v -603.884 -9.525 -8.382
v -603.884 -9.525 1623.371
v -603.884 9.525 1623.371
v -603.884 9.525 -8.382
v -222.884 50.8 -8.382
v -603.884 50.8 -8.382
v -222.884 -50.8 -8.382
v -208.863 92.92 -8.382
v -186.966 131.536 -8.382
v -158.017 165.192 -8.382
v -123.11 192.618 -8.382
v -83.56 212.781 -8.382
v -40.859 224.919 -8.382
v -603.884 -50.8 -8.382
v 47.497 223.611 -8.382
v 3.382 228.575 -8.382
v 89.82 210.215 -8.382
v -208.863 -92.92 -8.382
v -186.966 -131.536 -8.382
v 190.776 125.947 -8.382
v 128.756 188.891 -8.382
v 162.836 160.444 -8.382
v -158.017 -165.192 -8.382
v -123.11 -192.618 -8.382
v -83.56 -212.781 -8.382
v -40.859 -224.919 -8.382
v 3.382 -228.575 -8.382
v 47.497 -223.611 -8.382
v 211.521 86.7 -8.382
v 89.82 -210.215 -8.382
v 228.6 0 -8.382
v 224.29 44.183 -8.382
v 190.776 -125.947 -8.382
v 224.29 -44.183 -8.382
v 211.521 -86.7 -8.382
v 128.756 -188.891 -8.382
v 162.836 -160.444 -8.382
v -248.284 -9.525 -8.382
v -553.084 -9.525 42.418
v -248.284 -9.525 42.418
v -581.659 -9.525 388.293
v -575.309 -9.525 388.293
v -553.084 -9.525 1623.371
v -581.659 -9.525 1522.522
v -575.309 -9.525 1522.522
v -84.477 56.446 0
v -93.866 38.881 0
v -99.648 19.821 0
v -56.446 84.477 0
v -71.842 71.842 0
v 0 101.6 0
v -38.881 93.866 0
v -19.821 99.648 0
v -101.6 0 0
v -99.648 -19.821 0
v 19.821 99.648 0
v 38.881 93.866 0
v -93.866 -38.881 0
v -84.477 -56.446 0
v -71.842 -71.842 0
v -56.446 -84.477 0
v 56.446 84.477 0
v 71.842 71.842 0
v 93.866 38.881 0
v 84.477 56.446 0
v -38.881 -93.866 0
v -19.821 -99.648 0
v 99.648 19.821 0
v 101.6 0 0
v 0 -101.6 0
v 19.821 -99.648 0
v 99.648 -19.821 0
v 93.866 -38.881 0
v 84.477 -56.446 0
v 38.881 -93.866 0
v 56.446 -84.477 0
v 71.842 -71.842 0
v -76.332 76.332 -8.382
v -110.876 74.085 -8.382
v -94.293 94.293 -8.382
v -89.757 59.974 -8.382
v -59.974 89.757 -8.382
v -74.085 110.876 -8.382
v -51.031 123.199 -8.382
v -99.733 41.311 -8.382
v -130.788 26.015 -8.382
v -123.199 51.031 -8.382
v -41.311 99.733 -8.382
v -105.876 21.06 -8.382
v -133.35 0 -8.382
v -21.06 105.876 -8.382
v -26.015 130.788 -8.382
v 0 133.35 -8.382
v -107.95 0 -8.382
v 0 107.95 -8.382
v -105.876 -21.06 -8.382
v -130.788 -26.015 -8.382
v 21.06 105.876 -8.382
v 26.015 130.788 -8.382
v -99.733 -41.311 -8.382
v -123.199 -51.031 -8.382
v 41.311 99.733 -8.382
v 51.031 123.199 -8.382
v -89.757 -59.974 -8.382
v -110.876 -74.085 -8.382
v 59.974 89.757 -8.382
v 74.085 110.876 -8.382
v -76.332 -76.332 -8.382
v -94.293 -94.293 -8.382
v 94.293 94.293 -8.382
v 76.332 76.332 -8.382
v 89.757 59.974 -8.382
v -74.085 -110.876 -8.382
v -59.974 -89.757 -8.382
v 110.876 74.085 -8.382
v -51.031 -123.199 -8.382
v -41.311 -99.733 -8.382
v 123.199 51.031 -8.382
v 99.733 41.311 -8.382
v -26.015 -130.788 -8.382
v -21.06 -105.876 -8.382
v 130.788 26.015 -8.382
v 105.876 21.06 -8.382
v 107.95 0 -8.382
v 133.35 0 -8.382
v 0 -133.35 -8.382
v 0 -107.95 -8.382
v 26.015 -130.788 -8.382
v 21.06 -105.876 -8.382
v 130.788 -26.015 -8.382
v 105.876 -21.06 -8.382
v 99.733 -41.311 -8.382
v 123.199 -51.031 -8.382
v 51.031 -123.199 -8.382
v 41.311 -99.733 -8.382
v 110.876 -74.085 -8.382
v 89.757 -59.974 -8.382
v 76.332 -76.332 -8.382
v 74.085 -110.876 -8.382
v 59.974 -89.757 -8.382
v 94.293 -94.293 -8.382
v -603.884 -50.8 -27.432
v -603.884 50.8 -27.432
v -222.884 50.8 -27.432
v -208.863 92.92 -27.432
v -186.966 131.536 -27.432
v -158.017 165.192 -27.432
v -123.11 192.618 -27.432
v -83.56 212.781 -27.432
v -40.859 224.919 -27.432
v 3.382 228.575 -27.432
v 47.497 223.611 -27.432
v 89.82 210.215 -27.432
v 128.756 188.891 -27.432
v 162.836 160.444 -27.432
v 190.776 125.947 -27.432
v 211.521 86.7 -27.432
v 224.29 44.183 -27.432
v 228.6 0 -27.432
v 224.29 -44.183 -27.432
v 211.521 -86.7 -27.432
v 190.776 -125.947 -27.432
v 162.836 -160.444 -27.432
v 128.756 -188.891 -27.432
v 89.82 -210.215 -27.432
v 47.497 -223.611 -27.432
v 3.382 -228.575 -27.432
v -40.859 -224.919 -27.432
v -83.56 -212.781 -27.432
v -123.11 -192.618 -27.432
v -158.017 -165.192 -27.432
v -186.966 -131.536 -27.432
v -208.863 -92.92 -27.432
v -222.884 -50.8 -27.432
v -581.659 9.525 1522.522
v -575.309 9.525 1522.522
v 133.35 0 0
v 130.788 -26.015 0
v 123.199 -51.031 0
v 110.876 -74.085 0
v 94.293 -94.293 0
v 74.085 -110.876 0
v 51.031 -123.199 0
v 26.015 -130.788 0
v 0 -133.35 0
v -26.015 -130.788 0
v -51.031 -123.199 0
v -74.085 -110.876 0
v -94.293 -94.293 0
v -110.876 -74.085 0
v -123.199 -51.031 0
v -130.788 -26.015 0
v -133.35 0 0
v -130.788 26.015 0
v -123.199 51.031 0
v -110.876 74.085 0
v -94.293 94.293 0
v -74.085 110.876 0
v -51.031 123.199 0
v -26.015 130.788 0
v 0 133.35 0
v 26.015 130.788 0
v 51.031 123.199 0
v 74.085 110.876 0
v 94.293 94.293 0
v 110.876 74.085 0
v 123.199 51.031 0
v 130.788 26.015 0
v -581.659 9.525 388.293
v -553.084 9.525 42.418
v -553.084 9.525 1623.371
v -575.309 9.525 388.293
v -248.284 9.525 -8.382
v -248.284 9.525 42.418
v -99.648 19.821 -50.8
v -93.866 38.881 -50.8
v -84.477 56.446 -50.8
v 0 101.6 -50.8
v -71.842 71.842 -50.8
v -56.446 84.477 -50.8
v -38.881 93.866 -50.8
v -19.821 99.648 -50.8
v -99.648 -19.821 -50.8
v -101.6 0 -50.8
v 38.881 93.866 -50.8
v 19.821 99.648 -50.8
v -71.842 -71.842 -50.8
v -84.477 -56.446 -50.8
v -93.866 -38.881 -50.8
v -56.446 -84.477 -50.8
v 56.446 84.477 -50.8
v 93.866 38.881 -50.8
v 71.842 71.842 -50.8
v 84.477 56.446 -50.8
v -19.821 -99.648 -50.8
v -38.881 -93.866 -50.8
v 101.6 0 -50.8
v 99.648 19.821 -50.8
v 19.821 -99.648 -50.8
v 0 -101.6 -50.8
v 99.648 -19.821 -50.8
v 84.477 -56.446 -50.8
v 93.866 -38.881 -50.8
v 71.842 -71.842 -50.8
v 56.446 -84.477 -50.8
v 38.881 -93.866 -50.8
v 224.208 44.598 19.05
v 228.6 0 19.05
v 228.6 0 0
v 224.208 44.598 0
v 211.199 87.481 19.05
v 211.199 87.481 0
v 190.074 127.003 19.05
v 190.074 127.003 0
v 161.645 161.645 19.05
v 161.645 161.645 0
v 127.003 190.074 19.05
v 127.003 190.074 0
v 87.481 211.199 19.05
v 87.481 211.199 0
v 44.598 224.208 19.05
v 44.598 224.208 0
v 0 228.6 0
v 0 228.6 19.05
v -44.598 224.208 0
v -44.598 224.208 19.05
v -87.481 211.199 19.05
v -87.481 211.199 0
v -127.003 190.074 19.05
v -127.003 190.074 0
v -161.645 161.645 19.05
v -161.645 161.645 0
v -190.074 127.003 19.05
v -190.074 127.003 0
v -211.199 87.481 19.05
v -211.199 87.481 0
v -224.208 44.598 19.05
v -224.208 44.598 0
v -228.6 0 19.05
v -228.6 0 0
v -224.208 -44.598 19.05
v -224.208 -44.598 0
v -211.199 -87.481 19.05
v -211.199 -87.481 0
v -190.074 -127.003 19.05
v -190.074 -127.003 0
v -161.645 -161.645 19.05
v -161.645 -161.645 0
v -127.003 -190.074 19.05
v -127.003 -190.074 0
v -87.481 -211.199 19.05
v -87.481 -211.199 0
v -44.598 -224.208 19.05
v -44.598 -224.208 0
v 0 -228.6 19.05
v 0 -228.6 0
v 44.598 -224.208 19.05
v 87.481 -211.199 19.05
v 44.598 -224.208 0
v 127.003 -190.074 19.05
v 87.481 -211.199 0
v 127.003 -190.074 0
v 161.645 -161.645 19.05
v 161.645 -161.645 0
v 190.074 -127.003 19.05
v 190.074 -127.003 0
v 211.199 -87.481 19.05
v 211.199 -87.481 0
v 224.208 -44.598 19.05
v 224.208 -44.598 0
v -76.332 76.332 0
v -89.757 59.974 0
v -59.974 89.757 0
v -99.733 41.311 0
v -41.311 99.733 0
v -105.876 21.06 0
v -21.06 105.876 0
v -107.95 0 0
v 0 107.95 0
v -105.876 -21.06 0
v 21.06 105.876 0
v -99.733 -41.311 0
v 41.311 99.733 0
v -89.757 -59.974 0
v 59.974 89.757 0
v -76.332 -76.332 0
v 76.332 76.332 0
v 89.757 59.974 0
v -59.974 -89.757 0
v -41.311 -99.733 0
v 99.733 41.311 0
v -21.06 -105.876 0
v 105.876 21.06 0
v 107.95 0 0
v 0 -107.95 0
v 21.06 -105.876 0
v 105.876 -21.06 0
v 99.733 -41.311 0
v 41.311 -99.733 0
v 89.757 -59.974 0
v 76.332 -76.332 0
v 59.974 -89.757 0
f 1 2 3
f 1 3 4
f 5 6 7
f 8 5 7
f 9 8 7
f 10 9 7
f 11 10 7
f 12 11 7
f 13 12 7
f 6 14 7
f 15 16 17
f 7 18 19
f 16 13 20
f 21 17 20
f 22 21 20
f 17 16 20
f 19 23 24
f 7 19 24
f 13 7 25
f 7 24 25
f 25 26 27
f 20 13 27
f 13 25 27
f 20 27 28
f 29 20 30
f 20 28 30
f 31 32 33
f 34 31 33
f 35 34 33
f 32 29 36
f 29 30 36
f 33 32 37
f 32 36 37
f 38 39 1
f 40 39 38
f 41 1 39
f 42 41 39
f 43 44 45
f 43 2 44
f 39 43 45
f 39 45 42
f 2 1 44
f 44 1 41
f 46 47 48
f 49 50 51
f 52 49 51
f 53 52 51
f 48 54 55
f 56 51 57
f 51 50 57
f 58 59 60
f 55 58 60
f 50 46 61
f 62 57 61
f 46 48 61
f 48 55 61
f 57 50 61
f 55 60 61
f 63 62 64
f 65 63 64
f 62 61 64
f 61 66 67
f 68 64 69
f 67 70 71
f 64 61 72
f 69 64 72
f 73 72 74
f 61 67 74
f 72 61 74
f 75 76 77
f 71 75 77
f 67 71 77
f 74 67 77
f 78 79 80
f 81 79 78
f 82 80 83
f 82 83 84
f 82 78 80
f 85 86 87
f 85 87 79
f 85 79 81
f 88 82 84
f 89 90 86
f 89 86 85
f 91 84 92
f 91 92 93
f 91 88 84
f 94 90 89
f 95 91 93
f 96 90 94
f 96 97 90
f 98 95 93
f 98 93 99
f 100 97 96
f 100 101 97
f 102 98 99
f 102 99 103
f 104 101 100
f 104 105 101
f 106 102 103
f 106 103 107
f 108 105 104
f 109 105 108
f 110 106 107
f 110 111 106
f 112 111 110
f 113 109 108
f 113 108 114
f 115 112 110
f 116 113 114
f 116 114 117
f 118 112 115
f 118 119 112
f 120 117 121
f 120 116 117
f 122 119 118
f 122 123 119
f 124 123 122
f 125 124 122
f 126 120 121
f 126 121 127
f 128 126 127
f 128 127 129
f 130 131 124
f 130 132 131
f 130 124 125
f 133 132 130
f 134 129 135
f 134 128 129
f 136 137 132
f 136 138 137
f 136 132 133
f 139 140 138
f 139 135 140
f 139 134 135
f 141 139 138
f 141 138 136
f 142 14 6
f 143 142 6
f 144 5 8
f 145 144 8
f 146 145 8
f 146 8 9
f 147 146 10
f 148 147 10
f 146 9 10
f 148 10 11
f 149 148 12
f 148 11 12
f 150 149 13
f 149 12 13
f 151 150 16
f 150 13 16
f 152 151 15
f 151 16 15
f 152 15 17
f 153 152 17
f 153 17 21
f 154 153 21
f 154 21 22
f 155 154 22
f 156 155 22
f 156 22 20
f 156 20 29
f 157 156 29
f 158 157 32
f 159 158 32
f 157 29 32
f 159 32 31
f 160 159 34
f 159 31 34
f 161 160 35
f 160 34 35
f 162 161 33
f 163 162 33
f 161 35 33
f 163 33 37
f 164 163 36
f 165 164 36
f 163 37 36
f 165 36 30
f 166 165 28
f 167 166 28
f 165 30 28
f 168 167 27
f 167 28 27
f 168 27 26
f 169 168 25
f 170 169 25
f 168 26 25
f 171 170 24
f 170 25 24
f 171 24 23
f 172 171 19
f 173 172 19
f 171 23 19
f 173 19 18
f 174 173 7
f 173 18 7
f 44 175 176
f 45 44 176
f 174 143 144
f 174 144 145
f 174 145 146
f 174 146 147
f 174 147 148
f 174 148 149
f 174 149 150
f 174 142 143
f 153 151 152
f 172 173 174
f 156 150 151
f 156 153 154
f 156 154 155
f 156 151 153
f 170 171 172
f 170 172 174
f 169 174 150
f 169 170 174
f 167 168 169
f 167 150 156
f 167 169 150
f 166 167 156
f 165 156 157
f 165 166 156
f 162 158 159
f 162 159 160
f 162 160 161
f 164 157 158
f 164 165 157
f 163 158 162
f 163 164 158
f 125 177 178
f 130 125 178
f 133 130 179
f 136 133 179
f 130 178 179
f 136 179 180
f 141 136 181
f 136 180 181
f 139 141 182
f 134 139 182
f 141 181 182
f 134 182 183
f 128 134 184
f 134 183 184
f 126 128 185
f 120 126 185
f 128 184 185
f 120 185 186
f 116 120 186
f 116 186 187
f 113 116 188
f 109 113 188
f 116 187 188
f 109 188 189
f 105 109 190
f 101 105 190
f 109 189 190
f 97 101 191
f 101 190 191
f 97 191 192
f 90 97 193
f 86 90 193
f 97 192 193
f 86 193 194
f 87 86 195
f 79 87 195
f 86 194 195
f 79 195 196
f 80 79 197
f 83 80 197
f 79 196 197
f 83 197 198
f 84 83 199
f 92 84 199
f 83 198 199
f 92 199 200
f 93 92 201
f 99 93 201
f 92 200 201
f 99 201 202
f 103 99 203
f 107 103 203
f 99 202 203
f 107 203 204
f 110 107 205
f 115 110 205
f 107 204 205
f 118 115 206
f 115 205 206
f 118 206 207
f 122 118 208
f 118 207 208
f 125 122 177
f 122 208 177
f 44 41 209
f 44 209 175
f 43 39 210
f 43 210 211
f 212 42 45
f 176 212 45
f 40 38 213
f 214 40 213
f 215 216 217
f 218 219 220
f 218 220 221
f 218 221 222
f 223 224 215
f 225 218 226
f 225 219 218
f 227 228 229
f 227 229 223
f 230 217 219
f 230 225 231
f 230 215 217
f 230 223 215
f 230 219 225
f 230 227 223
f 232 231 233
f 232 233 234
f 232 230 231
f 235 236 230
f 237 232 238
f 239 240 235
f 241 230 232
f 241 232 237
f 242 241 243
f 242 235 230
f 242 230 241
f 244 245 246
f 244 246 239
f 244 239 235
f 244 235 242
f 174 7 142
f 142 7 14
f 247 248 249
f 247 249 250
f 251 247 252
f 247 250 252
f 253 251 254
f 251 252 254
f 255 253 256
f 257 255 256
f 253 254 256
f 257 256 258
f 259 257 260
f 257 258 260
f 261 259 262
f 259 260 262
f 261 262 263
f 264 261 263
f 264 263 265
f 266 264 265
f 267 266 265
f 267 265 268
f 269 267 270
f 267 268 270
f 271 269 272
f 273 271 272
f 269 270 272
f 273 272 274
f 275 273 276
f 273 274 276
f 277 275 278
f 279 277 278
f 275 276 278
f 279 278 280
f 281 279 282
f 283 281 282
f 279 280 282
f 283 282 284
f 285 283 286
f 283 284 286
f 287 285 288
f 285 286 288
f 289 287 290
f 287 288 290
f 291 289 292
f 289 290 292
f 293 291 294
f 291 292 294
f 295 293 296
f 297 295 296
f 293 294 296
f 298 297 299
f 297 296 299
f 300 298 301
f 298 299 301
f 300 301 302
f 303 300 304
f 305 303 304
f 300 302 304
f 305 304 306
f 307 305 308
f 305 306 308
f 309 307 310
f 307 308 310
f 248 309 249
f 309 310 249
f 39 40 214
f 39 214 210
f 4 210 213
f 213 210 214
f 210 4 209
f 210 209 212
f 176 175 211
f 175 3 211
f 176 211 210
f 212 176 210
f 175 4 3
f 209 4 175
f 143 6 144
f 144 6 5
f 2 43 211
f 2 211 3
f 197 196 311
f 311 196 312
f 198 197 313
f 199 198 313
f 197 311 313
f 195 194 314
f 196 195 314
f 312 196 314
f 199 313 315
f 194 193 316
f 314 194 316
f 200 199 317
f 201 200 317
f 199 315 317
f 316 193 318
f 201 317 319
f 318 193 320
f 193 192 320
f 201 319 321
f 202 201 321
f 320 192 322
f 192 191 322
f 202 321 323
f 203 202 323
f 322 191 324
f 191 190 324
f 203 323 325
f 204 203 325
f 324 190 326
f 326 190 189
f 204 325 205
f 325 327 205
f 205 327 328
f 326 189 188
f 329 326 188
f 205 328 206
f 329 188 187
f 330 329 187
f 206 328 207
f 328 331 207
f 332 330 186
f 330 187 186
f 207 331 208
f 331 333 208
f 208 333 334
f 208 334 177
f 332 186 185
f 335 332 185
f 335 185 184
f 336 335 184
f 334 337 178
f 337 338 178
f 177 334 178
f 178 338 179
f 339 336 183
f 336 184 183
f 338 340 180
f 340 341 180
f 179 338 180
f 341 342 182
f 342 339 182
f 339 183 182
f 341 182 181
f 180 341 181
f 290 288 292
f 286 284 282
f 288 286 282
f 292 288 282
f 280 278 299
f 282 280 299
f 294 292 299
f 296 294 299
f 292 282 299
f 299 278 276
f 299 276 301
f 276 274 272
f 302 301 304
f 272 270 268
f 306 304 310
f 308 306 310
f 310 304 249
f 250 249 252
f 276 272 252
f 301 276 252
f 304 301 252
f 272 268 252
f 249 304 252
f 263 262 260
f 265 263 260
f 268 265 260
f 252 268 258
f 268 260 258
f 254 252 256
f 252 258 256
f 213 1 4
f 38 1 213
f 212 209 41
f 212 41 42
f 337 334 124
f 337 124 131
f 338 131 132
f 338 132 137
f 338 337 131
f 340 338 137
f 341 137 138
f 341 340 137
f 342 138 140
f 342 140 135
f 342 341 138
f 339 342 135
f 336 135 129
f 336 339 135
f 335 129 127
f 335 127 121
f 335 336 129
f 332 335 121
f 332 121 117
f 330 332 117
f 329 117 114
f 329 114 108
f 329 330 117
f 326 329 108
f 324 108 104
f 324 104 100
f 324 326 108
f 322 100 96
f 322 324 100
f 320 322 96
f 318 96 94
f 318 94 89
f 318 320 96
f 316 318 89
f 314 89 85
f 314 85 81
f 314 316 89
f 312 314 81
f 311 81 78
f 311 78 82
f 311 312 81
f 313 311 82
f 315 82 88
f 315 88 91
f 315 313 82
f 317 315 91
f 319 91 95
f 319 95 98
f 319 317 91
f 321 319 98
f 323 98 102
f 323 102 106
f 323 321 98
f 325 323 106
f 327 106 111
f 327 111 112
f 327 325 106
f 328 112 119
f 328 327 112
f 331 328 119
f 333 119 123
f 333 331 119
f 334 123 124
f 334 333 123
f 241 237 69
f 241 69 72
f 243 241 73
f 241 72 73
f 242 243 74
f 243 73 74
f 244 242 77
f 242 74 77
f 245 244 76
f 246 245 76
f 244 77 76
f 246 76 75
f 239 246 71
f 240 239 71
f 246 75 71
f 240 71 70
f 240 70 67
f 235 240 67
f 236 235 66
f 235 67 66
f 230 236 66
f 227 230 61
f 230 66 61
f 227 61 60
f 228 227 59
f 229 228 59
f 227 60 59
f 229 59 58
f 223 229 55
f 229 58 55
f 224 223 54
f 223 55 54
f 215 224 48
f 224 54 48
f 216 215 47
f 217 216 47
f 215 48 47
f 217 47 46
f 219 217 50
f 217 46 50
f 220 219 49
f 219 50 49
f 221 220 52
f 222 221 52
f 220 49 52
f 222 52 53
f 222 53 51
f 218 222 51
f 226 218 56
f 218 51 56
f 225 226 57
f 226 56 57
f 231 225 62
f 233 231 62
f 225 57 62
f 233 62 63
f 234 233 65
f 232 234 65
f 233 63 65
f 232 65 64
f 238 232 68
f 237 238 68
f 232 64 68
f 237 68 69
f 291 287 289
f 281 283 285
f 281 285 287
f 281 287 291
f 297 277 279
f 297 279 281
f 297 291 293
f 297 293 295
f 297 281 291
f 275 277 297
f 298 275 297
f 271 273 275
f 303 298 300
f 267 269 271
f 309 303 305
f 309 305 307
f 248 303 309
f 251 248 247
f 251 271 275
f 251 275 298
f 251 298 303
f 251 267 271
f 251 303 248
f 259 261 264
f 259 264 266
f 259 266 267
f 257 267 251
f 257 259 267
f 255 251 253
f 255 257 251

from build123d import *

# Parameters (mm, degrees)
F0_R      = 228.6
F1_DEPTH  = 19.05
F2_R      = 101.6
F3_DEPTH  = 50.8
F4_R      = 133.35
F4_R_2    = 107.95
F5_DEPTH  = 8.382
F7_DEPTH  = 19.05
F8_W      = 50.8
F8_H      = 19.05
F9_DEPTH  = 50.8
F11_DEPTH = 19.05
F12_W     = 6.35
F12_H     = 1134.2298353541
F13_DEPTH = 19.05


with BuildPart() as f1:
    # F0 (on Top) → F1 (new body)
    with BuildSketch(Plane.XY):
        Circle(F0_R)
    extrude(amount=F1_DEPTH)


with BuildPart() as f3:
    # F2 (on face) → F3 (new body)
    with BuildSketch(Plane(origin=(0, 0, 0), x_dir=(1, 0, 0), z_dir=(0, 0, -1))):
        Circle(F2_R)
    extrude(amount=F3_DEPTH)


with BuildPart() as f5:
    # F4 (on face) → F5 (new body)
    with BuildSketch(Plane(origin=(0, 0, 0), x_dir=(1, 0, 0), z_dir=(0, 0, -1))):
        Circle(F4_R)
        Circle(F4_R_2, mode=Mode.SUBTRACT)
    extrude(amount=F5_DEPTH)


with BuildPart() as f7:
    # F6 (on face) → F7 (new body)
    with BuildSketch(Plane(origin=(0, 0, -8.382), x_dir=(1, 0, 0), z_dir=(0, 0, -1))):
        with BuildLine():
            Line((-603.8840954398, -50.8), (-222.8840954398, -50.8))
            ThreePointArc((-222.8840954398, -50.8), (228.6, 0), (-222.8840954398, 50.8))
            Line((-222.8840954398, 50.8), (-603.8840954398, 50.8))
            Line((-603.8840954398, 50.8), (-603.8840954398, -50.8))
        make_face()
    extrude(amount=F7_DEPTH)


with BuildPart() as f9:
    # F8 (on face) → F9 (new body)
    with BuildSketch(Plane.XY.offset(-8.382)):
        with Locations((-273.6840954398, 0)):
            Rectangle(F8_W, F8_H)
    extrude(amount=F9_DEPTH)

    # F10 (on face) → F11 (join)
    with BuildSketch(Plane.XZ.offset(9.525)):
        Polygon((-603.8840954398, -8.382), (-299.0840954398, -8.382), (-299.0840954398, 42.418), (-553.0840954398, 42.418), (-553.0840954398, 1623.370885849), (-603.8840954398, 1623.370885849), align=None)
    extrude(amount=-F11_DEPTH)

    # F12 (on face) → F13 (cut, through all)
    with BuildSketch(Plane.XZ.offset(9.525)):
        with Locations((-578.4840954398, 955.4074853659)):
            Rectangle(F12_W, F12_H)
    extrude(amount=-F13_DEPTH, mode=Mode.SUBTRACT)


solid = Compound([f1.part, f3.part, f5.part, f7.part, f9.part])
